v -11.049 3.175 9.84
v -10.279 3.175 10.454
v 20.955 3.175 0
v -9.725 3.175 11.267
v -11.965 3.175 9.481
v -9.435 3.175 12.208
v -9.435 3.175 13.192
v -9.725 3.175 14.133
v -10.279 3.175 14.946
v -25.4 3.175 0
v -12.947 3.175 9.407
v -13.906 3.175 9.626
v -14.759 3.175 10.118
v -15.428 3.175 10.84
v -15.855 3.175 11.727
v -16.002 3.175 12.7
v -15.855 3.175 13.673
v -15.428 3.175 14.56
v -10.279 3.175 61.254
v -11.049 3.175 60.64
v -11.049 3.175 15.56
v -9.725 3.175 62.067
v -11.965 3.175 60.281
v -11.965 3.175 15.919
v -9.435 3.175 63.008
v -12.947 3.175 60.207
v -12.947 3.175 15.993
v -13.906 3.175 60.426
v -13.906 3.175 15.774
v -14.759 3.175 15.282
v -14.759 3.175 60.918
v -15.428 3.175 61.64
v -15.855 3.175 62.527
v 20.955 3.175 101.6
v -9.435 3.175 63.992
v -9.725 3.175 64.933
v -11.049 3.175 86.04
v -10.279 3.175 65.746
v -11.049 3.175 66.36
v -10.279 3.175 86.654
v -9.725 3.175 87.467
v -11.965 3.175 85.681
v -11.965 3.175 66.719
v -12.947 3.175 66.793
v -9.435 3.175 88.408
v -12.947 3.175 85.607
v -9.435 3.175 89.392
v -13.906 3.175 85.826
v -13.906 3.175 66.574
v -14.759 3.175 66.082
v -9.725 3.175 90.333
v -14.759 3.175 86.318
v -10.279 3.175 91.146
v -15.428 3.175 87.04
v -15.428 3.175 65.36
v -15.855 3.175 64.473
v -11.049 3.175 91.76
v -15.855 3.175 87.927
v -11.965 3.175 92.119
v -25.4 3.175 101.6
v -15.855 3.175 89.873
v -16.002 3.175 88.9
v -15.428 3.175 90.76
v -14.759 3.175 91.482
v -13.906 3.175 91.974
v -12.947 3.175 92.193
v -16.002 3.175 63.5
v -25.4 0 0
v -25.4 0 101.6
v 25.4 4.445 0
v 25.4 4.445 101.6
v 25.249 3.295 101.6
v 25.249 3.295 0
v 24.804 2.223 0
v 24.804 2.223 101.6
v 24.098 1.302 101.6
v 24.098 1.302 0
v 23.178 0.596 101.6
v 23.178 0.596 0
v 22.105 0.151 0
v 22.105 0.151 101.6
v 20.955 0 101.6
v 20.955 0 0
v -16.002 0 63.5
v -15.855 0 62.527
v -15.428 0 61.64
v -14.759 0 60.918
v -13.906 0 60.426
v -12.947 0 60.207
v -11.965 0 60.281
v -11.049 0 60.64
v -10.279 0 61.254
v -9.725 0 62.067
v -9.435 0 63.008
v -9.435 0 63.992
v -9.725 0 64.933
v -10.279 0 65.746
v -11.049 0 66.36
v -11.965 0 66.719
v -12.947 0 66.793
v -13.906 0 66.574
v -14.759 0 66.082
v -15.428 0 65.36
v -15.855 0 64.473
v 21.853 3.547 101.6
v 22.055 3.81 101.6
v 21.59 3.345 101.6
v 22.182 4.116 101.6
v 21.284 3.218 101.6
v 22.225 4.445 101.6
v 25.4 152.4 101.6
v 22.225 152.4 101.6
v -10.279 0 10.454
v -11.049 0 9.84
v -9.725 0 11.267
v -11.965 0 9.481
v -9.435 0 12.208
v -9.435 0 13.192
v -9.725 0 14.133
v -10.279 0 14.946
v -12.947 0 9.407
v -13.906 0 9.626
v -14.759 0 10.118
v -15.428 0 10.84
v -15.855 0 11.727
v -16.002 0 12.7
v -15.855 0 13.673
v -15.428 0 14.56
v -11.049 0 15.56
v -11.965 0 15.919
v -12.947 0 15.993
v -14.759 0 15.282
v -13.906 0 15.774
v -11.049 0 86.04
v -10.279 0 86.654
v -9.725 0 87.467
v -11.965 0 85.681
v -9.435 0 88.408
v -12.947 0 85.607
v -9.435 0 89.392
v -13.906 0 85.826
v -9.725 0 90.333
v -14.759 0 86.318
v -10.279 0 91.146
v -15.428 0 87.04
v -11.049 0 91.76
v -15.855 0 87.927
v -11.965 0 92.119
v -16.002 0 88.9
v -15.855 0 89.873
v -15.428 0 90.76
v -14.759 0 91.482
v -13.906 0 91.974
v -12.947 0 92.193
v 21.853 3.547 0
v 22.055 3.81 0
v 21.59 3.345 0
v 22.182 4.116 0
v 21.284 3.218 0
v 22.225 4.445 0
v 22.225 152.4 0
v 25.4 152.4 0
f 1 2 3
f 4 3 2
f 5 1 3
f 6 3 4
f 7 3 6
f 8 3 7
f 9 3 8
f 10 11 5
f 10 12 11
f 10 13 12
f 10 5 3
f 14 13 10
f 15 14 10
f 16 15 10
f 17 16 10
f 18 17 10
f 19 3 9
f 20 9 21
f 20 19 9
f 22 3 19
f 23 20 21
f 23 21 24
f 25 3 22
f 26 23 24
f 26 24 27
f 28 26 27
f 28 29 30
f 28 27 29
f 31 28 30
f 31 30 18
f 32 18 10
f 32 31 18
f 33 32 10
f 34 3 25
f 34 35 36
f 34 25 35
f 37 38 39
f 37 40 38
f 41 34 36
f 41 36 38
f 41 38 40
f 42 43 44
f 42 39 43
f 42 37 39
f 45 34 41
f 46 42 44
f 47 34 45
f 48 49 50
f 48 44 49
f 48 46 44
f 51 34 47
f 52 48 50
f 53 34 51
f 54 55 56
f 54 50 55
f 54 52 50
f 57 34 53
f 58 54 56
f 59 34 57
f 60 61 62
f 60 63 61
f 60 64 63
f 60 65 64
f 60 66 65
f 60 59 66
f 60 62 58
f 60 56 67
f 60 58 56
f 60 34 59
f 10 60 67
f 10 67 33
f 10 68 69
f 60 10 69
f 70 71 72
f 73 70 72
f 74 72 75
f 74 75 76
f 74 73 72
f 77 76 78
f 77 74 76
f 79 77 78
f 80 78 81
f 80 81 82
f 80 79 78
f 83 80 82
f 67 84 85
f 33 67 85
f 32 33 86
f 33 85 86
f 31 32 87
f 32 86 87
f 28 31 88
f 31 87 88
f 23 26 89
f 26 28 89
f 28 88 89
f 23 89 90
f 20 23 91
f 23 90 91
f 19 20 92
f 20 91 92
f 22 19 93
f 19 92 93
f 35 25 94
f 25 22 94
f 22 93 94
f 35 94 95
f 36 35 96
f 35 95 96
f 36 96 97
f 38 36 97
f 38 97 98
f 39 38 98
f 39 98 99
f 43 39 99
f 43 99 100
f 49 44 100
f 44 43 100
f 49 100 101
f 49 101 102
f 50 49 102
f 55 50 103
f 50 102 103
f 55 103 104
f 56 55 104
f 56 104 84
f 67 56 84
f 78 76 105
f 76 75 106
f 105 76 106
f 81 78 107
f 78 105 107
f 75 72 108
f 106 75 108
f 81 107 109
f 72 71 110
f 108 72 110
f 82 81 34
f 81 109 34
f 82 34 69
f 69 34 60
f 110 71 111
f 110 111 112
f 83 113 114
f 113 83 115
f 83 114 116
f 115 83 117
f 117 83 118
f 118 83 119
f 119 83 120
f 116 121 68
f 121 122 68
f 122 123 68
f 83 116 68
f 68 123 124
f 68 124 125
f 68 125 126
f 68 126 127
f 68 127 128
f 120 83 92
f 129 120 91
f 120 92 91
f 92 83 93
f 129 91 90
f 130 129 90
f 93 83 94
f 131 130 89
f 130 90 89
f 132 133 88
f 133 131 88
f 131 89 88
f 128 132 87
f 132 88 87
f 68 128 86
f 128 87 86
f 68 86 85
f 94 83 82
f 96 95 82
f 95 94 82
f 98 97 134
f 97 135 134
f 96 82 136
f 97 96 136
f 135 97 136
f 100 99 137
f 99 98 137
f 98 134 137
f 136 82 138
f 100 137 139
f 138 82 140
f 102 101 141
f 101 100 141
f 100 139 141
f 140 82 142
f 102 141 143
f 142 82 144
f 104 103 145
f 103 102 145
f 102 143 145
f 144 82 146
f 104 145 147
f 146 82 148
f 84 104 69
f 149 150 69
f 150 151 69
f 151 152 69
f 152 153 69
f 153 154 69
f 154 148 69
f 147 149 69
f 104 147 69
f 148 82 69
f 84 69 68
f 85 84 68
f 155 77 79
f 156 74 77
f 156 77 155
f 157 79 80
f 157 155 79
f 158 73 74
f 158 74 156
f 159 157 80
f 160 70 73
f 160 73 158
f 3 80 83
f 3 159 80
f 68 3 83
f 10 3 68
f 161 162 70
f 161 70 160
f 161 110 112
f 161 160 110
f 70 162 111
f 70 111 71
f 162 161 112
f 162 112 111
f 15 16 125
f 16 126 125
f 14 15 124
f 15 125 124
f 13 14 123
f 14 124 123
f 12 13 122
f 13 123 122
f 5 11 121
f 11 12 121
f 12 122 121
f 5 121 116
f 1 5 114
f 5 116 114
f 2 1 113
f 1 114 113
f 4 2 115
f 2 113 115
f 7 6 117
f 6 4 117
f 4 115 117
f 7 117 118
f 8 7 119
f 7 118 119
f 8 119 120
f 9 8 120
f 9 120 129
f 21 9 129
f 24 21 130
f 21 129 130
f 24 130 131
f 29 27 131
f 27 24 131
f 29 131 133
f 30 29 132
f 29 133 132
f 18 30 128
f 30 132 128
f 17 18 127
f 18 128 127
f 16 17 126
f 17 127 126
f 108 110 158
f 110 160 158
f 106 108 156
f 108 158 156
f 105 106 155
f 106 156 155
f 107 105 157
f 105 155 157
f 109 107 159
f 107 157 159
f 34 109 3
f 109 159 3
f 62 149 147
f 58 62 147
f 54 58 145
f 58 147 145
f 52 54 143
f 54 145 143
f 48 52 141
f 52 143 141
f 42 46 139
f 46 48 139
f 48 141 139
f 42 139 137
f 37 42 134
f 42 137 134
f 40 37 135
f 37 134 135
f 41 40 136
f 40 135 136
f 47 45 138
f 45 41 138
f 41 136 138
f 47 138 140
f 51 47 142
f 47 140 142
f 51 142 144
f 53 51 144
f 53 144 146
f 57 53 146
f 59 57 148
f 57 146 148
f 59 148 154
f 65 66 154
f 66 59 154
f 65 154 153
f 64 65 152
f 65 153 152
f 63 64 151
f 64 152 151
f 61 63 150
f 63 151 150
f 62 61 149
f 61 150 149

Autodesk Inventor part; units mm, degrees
ref_plane "YZ Plane" through (0, 0, 0) normal (1, 0, 0) x (0, 1, 0)
ref_plane "XZ Plane" through (0, 0, 0) normal (0, 1, 0) x (-1, 0, 0)
ref_plane "XY Plane" through (0, 0, 0) normal (0, 0, 1) x (1, 0, 0)
sketch "Sketch1" plane through (0, 0, 0) normal (0, 1, 0) x (-1, 0, 0)
  line L0 (0, 0) -> (25.4, 0)
  line L1 (25.4, 0) -> (25.4, 101.6)
  line L2 (25.4, 101.6) -> (0, 101.6)
  line L3 (0, 101.6) -> (0, 0)
  line L4 (12.7, 101.6) -> (12.7, 0) construction
  circle A0 centre (12.7, 12.7) radius 3.302
  circle A1 centre (12.7, 63.5) radius 3.302
  circle A2 centre (12.7, 88.9) radius 3.302
  line L5 (0, 0) -> (-25.4, 0)
  line L6 (-25.4, 0) -> (-25.4, 101.6)
  line L7 (-25.4, 101.6) -> (0, 101.6)
  dimension "d0" = 101.6
  dimension "d2" = 25.4
  dimension "d3" = 6.604
  dimension "d4" = 25.4
  dimension "d5" = 50.8
  dimension "d6" = 12.7
  dimension "d8" = 25.4
extrude "Plate1" add sketch "Sketch1" along normal blind 3.175
sketch "Sketch2" plane through (22.225, 0, 0) normal (1, 0, 0) x (0, 1, 0)
  line L0 (0, 101.6) -> (0, 0)
  line L1 (0, 0) -> (152.4, 0)
  line L2 (152.4, 0) -> (152.4, 101.6)
  line L3 (152.4, 101.6) -> (0, 101.6)
edge flange "Flange1" height 152.4 angle 90 thickness 3.175 bend radius 1.27 thickness toward (1, 0, 0) relief straight relief width 3.175 relief depth 1.5875 edges at (25.4, 3.175, 50.8) wall of the first edge with corners at (22.225, 0, 101.6) (22.225, 0, 0) (22.225, 152.4, 0) (22.225, 152.4, 101.6)
bend "Bend1"
corner "Corner1"
sketch "Sketch3" plane through (25.4, 152.4, 101.6) normal (1, 0, 0) x (0, 0, -1)
  line L0 (0, -147.955) -> (101.6, -147.955) projected
  line L1 (101.6, 0) -> (101.6, -147.955) projected
  line L2 (0, 0) -> (101.6, 0) projected
  line L3 (0, -147.955) -> (0, 0) projected
  line L4 (12.7, -74.295) -> (27.94, -74.295) construction
  line L5 (27.94, -74.295) -> (27.94, -127) construction
  line L6 (27.94, -127) -> (12.7, -127) construction
  line L7 (12.7, -127) -> (12.7, -74.295) construction
  circle A0 centre (12.7, -74.295) radius 2.2225
  circle A1 centre (27.94, -74.295) radius 2.2225
  circle A2 centre (27.94, -127) radius 2.2225
  circle A3 centre (12.7, -127) radius 2.2225
  line L8 (101.6, -152.4) -> (0, -152.4) construction
  circle A4 centre (44.3804, -106.4123) radius 2.2225
  line L9 (44.3804, -106.4123) -> (82.4804, -106.4123) construction
  circle A5 centre (82.4804, -106.4123) radius 2.2225
  dimension "d19" = 52.705
  dimension "d21" = 15.24
  dimension "d22" = 4.445
  dimension "d23" = 25.4
  dimension "d24" = 12.7
  dimension "d25" = 38.1
  dimension "d26" = 4.445
equation "\"d9\" = BendReliefWidth"
equation "\"d10\" = BendReliefDepth"
equation "\"d11\" = MinimumRemnant"
equation "\"d12\" = BendRadius"
equation "\"d16\" = CornerReliefSize"
equation "\"d17\" = GapSize"
equation "\"d18\" = JacobiRadiusSize"
equation "\"BendRadius\" = Thickness"
equation "\"BendReliefWidth\" = Thickness"
equation "\"BendReliefDepth\" = 0.5 * Thickness"
equation "\"CornerReliefSize\" = 4 * Thickness"
equation "\"MinimumRemnant\" = 2 * Thickness"
equation "\"TransitionRadius\" = BendRadius"
equation "\"JacobiRadiusSize\" = Thickness"
equation "\"GapSize\" = Thickness"
equation "\"d7\" = BendRadius"
equation "\"Thickness\" = 3.175"
properties part number "Pneumatic Mount Bracket" material "Aluminum 6061"
